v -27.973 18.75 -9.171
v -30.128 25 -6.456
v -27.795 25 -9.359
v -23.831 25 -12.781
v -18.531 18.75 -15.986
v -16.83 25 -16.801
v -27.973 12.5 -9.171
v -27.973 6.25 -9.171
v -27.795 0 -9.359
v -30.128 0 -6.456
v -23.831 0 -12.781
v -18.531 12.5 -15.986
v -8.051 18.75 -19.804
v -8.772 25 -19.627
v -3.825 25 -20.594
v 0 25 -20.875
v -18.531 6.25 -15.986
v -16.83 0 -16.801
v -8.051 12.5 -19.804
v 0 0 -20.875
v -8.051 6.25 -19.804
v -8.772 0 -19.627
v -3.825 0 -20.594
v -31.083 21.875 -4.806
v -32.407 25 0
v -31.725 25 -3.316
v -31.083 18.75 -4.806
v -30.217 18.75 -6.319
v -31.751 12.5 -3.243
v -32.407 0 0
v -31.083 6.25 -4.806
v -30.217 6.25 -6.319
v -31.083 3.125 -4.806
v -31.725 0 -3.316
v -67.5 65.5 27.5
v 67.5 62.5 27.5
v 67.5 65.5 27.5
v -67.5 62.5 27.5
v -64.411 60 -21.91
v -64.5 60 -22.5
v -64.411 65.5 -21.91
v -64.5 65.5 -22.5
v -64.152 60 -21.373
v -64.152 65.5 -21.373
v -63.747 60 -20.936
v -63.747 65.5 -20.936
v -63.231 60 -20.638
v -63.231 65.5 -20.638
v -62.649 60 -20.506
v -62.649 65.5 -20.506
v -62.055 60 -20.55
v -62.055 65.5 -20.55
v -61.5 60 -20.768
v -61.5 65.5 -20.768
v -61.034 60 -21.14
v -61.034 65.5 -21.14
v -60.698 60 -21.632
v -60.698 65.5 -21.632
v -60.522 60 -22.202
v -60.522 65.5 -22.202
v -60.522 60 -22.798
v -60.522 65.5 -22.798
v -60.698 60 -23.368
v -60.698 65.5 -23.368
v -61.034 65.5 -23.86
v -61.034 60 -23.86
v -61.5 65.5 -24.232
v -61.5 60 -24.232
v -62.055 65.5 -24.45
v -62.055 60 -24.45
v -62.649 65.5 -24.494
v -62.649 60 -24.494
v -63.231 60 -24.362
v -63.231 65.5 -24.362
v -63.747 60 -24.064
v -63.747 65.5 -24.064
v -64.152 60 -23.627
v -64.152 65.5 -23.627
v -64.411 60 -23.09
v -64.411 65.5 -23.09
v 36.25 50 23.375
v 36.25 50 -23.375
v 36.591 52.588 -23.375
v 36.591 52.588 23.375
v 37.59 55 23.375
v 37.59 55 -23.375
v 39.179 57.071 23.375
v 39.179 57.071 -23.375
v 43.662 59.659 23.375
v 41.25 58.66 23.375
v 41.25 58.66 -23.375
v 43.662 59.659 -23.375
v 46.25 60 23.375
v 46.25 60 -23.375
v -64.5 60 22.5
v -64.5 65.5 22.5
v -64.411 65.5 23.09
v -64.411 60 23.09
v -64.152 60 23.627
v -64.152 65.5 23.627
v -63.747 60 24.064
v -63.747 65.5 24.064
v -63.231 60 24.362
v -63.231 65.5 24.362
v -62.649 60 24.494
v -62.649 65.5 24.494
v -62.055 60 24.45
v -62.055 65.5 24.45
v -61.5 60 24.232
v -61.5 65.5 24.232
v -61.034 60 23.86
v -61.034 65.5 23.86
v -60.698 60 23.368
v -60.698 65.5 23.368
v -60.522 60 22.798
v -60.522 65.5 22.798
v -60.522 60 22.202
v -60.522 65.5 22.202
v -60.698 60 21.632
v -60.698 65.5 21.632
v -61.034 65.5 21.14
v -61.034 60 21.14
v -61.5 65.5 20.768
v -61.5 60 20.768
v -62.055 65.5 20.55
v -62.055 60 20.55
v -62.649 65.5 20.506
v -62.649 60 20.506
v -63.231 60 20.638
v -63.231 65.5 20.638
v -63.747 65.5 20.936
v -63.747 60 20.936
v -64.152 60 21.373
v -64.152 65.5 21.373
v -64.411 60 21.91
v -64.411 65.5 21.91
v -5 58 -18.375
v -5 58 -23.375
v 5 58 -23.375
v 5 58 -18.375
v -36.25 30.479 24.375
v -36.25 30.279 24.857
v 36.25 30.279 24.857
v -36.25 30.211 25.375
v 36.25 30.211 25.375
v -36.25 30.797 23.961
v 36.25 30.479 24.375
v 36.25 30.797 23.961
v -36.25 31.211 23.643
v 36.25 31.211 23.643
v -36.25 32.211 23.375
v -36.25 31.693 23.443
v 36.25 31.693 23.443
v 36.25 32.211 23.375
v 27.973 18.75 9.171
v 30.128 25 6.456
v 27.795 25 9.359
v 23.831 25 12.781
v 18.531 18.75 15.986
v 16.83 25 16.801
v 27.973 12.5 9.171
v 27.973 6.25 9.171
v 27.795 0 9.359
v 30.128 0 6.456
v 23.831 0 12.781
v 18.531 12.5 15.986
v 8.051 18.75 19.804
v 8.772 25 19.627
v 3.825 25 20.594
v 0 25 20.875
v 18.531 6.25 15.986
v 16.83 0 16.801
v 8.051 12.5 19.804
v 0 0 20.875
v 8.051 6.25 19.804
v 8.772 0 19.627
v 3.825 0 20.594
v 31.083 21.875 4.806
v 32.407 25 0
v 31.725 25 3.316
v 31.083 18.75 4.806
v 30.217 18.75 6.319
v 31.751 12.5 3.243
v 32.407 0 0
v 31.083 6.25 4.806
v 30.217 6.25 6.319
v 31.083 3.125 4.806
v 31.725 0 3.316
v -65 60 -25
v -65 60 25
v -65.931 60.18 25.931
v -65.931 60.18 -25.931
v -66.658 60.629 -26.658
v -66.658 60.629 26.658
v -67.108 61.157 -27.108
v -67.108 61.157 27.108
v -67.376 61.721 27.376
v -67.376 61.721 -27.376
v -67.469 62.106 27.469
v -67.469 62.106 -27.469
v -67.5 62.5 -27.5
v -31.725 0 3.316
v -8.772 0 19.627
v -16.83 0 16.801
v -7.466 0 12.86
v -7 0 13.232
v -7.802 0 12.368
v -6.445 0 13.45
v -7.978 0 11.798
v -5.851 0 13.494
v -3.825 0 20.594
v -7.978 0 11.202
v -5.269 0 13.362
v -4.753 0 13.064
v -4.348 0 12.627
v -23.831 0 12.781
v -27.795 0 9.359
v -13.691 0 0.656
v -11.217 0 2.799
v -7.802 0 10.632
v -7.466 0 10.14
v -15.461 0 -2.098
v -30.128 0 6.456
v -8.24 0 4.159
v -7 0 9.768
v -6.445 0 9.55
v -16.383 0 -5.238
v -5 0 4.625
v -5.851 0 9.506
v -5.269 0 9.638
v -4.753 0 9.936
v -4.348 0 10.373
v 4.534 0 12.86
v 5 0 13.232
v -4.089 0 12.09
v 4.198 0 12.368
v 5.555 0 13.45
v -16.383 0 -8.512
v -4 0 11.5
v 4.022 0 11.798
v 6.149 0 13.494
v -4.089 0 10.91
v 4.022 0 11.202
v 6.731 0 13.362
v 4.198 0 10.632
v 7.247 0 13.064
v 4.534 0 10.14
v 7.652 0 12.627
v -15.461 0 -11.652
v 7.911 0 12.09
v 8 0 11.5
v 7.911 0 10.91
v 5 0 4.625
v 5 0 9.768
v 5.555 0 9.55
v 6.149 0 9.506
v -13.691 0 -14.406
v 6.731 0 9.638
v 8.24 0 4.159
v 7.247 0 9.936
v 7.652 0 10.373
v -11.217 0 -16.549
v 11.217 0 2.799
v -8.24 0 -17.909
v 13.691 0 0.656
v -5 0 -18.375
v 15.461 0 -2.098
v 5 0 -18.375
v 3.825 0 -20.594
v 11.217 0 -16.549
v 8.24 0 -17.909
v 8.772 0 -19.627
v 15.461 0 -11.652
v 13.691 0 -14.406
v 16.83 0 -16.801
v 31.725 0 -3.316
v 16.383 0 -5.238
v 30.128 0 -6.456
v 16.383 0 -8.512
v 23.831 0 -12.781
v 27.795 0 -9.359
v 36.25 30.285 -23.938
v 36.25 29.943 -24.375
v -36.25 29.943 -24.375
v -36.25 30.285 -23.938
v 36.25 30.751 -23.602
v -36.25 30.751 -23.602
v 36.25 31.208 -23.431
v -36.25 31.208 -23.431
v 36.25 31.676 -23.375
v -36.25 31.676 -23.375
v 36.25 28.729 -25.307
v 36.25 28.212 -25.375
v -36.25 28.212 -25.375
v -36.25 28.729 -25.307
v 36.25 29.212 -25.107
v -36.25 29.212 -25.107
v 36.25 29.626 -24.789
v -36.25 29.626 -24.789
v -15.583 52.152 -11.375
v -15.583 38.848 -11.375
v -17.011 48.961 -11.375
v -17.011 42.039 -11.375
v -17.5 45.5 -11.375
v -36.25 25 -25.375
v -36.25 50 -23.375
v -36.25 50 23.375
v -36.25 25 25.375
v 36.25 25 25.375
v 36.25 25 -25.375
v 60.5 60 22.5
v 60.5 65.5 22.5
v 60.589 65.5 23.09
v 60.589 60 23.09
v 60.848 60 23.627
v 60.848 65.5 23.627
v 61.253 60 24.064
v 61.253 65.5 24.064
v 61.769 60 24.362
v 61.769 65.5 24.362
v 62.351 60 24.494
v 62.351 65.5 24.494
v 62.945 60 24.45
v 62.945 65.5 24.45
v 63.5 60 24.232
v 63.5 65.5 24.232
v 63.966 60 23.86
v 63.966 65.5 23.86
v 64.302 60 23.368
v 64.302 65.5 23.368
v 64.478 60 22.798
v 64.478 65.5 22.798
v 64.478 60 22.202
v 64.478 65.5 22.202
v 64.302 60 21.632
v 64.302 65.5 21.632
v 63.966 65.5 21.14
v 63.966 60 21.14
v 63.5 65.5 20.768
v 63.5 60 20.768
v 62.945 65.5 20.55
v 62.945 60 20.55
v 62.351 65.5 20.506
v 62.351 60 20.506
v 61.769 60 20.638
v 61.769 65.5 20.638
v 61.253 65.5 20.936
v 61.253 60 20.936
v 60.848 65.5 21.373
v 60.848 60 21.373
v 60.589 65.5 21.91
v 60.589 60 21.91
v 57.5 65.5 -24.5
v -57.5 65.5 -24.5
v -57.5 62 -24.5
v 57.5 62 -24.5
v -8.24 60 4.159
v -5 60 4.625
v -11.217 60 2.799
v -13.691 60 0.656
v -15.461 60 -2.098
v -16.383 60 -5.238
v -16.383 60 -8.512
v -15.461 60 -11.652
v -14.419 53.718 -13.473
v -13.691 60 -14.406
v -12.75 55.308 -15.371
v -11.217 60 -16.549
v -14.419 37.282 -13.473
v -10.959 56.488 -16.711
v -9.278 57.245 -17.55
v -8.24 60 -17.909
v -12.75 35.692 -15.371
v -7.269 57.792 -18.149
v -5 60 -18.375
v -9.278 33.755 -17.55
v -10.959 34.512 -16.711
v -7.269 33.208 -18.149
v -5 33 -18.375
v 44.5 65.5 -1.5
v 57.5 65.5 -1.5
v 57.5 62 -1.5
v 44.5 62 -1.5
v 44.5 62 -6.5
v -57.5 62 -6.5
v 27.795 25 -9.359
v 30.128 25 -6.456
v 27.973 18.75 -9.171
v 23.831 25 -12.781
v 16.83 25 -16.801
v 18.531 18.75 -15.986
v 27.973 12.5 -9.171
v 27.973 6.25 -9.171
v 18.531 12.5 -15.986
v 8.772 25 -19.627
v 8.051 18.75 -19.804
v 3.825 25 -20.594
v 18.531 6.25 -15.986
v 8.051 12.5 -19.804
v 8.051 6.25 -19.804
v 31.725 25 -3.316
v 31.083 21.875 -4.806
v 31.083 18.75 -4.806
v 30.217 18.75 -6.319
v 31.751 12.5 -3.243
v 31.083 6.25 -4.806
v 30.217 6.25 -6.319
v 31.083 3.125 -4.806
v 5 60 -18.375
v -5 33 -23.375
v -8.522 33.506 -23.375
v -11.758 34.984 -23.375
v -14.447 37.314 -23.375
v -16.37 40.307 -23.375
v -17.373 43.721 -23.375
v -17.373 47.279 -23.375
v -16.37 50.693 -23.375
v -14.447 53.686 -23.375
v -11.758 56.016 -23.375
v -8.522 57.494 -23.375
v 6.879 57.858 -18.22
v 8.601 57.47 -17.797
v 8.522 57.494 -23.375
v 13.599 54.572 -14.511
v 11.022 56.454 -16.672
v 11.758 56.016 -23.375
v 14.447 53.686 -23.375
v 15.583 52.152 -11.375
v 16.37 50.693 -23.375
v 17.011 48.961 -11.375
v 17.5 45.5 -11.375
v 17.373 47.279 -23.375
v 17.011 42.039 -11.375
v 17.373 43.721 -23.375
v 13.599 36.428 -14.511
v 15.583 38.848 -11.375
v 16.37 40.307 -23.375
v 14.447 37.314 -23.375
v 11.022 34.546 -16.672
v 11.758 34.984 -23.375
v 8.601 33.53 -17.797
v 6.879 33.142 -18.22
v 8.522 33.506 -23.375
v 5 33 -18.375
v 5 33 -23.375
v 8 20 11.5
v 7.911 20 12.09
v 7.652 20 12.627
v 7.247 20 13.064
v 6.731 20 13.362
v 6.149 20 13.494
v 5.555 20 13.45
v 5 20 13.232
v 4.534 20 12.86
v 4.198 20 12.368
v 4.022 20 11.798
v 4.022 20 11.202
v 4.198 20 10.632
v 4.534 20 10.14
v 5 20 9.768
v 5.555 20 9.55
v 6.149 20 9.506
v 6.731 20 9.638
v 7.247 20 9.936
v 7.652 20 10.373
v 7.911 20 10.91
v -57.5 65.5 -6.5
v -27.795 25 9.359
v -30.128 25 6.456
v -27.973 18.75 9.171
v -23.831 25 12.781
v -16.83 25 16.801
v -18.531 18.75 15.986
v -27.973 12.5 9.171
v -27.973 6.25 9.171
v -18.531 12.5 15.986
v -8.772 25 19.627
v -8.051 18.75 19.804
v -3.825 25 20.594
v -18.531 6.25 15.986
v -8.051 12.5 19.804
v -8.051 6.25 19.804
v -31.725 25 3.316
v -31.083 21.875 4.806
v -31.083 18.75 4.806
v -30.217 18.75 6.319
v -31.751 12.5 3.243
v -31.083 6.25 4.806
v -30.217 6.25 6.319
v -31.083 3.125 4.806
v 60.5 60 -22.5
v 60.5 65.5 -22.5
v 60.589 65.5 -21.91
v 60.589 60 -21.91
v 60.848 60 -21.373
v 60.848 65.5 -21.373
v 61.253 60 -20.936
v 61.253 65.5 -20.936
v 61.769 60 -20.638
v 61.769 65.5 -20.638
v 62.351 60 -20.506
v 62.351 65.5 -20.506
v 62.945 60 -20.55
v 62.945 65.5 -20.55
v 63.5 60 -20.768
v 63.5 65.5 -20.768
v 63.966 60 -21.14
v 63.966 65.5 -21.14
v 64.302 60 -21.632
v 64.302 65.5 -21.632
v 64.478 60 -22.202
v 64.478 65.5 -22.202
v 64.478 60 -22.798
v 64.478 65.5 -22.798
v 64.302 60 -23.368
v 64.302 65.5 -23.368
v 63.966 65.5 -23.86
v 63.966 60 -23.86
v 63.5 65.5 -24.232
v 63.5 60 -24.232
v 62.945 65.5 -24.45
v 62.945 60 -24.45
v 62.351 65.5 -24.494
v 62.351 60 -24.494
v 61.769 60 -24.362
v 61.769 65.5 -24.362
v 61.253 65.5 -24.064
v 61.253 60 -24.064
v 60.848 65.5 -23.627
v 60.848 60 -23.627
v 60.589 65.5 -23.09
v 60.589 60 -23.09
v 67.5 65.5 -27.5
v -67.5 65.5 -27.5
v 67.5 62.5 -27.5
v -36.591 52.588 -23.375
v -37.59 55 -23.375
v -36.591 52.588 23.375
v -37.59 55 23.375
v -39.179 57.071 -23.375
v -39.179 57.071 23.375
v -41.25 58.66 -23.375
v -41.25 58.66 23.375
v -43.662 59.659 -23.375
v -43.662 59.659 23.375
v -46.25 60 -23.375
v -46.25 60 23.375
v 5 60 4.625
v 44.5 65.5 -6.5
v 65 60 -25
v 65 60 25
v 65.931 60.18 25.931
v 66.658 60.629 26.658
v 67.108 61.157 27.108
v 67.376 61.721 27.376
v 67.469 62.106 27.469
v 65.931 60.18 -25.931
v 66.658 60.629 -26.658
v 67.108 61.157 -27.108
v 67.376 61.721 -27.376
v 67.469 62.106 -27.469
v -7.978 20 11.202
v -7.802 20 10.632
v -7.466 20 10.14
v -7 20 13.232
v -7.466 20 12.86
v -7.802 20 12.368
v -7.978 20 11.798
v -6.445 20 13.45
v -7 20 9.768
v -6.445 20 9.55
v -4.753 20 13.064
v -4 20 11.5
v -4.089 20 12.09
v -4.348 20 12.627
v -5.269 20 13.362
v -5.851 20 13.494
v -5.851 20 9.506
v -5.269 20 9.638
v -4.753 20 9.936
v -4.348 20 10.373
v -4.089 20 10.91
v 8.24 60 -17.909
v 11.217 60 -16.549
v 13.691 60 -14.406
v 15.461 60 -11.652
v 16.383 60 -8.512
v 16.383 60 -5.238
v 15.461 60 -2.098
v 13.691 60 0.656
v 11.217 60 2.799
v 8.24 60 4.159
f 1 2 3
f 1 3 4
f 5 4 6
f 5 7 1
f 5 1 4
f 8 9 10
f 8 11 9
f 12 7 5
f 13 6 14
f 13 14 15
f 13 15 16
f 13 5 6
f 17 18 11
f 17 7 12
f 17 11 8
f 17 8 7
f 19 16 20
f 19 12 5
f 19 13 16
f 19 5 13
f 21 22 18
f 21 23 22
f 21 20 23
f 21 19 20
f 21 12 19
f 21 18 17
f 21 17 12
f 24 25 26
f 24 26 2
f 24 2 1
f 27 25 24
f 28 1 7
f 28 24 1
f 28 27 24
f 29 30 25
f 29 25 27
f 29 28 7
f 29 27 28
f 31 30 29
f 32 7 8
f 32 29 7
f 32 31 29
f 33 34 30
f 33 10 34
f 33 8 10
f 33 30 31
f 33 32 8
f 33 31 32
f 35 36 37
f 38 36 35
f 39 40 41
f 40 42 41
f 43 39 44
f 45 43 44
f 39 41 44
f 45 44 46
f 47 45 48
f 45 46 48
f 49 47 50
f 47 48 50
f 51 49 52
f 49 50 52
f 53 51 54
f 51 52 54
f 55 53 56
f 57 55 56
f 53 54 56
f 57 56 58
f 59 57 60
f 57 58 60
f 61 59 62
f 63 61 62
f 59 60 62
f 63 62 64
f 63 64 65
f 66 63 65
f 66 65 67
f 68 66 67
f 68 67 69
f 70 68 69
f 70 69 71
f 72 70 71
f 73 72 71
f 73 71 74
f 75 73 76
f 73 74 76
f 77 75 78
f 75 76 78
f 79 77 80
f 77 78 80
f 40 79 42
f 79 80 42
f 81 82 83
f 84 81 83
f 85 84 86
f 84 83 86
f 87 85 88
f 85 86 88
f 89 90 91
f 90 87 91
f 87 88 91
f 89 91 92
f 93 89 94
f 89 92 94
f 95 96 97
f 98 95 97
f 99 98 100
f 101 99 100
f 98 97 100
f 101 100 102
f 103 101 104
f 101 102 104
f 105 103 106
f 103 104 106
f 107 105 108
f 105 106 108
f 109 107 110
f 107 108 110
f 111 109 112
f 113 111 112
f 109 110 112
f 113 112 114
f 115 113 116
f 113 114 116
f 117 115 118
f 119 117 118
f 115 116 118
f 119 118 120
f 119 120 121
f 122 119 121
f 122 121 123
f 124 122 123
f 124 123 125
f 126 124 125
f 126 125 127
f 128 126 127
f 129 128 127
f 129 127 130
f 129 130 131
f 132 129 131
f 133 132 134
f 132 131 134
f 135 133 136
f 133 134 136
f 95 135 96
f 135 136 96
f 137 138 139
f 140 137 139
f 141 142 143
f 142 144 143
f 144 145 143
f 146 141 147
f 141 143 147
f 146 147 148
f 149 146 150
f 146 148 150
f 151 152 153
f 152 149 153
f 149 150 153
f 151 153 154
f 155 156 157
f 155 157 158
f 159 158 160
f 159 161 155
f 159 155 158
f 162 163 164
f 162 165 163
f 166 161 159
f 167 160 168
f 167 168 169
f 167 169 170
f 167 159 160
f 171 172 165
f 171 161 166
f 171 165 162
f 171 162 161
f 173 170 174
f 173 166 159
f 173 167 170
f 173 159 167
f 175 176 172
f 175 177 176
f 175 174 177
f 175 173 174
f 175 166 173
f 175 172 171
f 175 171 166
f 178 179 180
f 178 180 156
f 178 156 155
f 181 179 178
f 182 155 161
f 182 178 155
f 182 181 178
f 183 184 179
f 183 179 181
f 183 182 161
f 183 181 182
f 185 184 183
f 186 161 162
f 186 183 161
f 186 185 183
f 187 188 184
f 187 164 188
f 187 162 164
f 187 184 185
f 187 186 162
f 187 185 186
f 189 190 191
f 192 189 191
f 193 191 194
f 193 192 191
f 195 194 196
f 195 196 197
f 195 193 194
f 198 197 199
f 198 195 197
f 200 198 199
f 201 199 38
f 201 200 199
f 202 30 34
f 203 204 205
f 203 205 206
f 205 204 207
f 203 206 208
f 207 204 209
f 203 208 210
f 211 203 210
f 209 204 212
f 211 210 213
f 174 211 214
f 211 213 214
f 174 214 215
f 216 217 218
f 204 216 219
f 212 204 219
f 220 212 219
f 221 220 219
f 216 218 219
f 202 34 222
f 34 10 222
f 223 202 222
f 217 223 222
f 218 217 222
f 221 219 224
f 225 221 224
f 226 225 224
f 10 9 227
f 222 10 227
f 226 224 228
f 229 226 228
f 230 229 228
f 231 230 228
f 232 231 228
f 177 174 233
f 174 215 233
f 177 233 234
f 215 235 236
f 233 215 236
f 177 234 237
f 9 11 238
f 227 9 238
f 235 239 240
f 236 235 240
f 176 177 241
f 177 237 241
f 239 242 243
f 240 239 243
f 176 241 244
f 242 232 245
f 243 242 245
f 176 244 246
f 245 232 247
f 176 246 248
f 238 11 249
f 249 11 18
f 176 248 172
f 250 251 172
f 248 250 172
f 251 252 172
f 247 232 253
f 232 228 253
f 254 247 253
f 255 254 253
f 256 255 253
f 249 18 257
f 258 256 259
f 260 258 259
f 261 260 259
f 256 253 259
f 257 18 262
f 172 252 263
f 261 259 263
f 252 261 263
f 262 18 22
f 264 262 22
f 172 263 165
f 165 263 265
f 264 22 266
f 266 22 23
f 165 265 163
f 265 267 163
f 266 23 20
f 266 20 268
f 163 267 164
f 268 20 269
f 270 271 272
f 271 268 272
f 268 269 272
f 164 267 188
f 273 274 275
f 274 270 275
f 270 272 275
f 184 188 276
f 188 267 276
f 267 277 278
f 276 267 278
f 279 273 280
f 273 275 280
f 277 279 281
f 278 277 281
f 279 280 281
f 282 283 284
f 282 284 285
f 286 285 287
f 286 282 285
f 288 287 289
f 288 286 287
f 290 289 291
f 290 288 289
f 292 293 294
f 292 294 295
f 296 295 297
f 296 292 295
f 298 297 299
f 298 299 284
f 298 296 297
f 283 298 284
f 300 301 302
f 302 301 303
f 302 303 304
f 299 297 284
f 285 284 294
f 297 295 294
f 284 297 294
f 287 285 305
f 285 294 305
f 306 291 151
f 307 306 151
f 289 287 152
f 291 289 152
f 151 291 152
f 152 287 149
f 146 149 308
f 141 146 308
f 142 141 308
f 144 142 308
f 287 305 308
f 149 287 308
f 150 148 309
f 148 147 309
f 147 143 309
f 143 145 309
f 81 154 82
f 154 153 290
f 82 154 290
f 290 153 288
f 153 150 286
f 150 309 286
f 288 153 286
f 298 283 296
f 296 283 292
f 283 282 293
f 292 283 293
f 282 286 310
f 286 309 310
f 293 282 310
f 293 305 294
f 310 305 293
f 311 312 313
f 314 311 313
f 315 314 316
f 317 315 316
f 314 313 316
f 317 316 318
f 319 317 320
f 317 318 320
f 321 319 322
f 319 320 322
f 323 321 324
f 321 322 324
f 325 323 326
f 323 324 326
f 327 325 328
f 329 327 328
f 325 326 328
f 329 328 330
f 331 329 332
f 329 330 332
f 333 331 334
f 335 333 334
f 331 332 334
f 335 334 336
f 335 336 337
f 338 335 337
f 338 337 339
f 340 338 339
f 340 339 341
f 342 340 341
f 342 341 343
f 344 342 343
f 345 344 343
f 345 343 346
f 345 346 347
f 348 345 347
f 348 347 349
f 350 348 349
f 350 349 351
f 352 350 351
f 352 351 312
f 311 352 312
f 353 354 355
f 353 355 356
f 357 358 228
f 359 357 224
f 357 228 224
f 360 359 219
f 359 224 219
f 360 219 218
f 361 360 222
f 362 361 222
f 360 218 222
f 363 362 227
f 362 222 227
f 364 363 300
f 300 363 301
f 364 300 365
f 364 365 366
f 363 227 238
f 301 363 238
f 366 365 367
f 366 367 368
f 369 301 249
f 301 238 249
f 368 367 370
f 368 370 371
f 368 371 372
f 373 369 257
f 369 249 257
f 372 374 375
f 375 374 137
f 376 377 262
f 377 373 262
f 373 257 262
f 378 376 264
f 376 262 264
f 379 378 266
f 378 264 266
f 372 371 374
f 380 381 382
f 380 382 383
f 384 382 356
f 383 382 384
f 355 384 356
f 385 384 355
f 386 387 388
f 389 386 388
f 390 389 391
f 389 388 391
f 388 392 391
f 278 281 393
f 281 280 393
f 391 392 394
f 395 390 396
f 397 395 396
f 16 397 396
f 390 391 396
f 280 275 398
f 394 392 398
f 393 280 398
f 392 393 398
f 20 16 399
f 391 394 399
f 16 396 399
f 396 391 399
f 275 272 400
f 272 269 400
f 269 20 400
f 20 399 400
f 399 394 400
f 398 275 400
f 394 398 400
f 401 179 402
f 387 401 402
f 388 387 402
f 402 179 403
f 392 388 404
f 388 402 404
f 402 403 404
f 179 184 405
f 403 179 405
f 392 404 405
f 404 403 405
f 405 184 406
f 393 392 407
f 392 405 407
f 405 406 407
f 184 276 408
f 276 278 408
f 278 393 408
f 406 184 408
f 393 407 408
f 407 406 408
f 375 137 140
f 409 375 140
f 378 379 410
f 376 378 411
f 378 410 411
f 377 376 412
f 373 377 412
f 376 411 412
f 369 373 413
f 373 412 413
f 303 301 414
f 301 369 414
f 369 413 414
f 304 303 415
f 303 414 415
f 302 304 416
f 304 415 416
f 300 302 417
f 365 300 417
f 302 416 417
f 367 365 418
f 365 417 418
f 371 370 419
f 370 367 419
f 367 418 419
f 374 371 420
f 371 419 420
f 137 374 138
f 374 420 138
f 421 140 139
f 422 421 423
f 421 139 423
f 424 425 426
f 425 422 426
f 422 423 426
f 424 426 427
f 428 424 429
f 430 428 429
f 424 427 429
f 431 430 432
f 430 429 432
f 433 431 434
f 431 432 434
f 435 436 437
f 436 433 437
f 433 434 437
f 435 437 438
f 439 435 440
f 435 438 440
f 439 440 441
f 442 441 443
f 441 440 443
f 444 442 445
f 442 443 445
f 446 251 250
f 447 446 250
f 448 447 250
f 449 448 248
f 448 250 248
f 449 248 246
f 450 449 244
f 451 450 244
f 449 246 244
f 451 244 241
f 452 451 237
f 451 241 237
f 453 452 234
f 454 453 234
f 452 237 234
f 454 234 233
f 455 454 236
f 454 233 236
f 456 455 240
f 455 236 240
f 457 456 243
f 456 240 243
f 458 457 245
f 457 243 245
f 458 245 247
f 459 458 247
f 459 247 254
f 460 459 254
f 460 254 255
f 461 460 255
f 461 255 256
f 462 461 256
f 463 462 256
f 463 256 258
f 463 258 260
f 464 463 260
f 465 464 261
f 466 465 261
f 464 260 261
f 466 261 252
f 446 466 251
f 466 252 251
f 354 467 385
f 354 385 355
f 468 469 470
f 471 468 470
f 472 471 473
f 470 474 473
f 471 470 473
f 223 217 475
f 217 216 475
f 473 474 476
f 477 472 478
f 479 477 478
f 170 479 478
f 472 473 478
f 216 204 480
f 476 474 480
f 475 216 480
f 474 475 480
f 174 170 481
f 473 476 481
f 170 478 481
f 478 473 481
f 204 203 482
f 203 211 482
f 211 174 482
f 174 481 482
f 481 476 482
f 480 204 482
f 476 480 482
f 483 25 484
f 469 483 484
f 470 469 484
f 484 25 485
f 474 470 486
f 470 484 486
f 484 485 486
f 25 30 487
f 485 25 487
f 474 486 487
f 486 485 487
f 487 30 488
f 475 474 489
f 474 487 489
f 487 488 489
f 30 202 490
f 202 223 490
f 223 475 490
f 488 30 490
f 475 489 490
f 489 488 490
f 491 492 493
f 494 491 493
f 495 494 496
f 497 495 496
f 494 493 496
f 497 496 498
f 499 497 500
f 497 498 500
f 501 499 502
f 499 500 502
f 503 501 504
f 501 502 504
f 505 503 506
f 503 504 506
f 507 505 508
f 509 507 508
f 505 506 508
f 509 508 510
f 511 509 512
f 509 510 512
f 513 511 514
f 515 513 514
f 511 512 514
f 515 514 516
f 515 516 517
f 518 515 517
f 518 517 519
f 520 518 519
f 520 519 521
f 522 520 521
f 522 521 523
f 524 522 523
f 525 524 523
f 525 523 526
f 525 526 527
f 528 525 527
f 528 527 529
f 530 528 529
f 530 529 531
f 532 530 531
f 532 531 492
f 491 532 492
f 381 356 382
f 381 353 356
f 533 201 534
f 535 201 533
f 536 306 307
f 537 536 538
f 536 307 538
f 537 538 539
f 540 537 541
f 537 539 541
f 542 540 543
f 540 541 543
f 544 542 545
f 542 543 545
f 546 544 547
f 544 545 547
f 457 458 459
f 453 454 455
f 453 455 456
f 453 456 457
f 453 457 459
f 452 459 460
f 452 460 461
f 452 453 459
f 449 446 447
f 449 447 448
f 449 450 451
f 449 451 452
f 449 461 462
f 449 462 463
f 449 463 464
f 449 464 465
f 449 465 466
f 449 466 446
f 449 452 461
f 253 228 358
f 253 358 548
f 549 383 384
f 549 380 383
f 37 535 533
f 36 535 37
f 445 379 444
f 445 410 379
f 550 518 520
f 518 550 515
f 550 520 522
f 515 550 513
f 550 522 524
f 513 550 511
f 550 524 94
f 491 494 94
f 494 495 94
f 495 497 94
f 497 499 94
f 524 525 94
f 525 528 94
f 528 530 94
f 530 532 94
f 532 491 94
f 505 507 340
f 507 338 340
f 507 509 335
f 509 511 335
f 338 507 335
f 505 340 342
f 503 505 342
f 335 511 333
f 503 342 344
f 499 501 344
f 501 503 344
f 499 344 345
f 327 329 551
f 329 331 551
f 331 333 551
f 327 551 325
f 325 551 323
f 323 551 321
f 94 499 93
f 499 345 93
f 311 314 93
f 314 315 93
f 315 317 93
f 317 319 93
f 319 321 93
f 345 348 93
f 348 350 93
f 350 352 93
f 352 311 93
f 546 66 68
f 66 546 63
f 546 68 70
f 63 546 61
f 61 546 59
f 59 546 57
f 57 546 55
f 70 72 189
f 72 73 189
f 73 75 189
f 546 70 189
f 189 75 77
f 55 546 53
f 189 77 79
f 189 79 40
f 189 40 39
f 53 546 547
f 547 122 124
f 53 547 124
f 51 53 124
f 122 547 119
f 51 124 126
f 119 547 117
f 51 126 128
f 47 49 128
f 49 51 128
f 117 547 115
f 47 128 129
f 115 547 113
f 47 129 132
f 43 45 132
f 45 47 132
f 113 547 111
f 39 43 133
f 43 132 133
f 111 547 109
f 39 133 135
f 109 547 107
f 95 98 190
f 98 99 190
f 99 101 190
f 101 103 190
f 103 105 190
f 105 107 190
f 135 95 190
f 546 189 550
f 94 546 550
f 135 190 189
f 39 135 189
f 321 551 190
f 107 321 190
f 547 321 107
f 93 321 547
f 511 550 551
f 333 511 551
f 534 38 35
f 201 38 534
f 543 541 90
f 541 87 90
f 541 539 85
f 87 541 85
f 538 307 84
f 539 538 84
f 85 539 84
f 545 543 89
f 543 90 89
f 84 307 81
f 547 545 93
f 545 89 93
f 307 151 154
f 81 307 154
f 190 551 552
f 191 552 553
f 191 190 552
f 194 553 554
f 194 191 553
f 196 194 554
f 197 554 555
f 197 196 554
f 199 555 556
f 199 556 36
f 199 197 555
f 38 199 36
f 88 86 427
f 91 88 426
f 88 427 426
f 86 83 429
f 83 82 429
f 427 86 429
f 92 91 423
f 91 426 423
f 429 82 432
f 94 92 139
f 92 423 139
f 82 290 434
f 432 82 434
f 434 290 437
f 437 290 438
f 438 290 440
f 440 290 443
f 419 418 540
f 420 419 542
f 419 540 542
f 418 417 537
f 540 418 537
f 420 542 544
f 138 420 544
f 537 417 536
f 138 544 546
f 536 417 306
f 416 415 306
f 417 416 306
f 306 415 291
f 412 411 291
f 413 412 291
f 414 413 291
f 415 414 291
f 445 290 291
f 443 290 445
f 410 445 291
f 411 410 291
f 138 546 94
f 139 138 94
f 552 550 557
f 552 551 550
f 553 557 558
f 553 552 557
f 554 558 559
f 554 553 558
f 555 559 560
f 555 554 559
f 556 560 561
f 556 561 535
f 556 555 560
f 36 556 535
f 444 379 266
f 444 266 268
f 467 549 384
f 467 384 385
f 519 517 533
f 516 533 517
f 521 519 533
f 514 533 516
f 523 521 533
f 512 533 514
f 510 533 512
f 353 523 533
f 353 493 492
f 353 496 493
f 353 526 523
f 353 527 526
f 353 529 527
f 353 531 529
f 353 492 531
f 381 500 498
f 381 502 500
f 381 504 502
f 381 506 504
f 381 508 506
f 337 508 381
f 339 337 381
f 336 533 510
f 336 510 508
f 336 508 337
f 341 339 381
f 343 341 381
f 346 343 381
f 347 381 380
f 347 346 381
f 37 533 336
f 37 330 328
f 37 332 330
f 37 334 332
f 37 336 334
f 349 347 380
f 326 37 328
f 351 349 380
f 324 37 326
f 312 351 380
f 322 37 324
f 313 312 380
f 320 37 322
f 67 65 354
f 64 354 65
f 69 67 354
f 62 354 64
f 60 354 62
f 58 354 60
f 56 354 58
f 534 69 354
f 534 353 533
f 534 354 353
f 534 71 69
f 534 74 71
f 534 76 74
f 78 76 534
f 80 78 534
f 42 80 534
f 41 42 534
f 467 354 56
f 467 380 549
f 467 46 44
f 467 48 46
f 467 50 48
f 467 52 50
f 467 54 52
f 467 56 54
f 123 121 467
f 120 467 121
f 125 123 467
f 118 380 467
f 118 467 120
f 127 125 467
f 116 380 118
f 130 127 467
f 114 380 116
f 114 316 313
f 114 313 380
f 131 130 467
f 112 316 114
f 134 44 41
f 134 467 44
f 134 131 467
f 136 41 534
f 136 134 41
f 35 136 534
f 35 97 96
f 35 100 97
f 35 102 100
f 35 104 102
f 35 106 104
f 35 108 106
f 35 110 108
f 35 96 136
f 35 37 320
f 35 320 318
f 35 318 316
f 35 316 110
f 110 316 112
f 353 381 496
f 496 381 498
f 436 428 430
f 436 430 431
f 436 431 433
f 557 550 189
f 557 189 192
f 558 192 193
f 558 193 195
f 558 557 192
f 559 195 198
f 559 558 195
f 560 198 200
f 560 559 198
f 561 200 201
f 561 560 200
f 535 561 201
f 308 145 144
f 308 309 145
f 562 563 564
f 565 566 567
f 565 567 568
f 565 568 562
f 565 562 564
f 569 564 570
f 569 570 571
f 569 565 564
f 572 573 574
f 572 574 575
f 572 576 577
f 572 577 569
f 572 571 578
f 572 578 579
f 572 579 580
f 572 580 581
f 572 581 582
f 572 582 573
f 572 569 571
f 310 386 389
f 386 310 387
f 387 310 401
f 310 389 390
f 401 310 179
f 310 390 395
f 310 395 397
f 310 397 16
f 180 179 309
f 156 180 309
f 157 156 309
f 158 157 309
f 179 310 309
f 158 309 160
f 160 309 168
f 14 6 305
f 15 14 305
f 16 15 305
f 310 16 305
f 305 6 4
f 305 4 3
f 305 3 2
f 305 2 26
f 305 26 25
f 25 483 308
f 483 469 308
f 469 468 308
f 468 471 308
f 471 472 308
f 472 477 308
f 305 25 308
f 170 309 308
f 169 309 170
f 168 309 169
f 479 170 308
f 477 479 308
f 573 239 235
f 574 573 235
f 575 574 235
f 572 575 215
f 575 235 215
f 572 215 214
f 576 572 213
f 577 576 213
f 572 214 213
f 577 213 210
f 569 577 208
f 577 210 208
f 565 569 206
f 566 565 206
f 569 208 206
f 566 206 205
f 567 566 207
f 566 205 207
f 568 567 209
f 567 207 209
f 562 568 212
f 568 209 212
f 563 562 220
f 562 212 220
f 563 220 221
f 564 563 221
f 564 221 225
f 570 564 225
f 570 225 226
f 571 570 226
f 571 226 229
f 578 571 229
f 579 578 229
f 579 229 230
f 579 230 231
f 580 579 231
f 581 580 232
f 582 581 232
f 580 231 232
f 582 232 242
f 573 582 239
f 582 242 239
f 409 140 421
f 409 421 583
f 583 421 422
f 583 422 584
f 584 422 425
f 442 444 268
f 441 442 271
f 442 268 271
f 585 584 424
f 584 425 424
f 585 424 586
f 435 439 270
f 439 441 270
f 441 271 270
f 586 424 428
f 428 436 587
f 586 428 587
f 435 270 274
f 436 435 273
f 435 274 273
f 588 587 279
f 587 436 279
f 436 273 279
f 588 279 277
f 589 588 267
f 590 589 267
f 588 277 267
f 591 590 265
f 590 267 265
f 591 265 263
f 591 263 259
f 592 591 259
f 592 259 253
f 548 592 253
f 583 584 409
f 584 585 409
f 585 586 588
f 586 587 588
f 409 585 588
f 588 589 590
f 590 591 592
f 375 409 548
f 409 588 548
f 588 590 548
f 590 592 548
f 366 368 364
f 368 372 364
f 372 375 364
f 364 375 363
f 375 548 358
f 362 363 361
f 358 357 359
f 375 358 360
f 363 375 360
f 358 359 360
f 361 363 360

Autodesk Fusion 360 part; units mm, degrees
sketch "Sketch1" plane through (0, 0, 0) normal (0, 1, 0) x (1, 0, 0)
  line L0 (-36.25, -23.375) -> (36.25, -23.375)
  line L1 (36.25, -23.375) -> (36.25, 23.375)
  line L2 (36.25, 23.375) -> (-36.25, 23.375)
  line L3 (-36.25, 23.375) -> (-36.25, -23.375)
  dimension "d62" = 72.5
  dimension "d63" = 46.75
  dimension "d64" = 23.375
  dimension "d65" = 36.25
extrude "Extrude9" add sketch "Sketch1" along normal blind 60
sketch "Sketch8" plane through (0, 0, 0) normal (0, 1, 0) x (1, 0, 0)
  line L0 (-5, -4.625) -> (5, -4.625)
  line L1 (-5, 18.375) -> (5, 18.375)
  arc A0 (-5, 18.375) -> (-5, -4.625) centre (-5, 6.875) ccw
  arc A1 (5, -4.625) -> (5, 18.375) centre (5, 6.875) ccw
  line L2 (36.25, 23.375) -> (-36.25, 23.375)
  line L3 (36.25, 23.375) -> (-36.25, 23.375)
  dimension "d39" = 10
  dimension "d40" = 5
  dimension "d94" = 23
  dimension "d123" = 28
extrude "Extrude10" cut sketch "Sketch8" along normal blind 95
sketch "Sketch9" plane through (0, 0, -23.375) normal (0, 0, -1) x (1, 0, 0)
  line L0 (36.25, 0) -> (-36.25, 0)
  line L1 (-36.25, 0) -> (-36.25, -60)
  line L2 (-36.25, -60) -> (36.25, -60)
  line L3 (36.25, -60) -> (36.25, 0)
  line L4 (-5, -33) -> (5, -33)
  line L5 (-5, -58) -> (5, -58)
  arc A0 (-5, -33) -> (-5, -58) centre (-5, -45.5) ccw
  arc A1 (5, -58) -> (5, -33) centre (5, -45.5) ccw
  dimension "d45" = 10
  dimension "d46" = 10
  dimension "d47" = 5
  dimension "d75" = 2
  dimension "d95" = 25
extrude "Extrude11" cut sketch "Sketch9" against normal blind 12 contours L4 L5 A0 A1
sketch "Sketch10" plane through (0, 60, 0) normal (0, 1, 0) x (-1, 0, 0)
  line L0 (36.25, -23.375) -> (36.25, 23.375)
  line L1 (36.25, 23.375) -> (-36.25, 23.375)
  line L2 (-36.25, 23.375) -> (-36.25, -23.375)
  line L3 (-36.25, -23.375) -> (36.25, -23.375)
  line L4 (-67.5, 27.5) -> (67.5, 27.5)
  line L5 (67.5, 27.5) -> (67.5, -27.5)
  line L6 (67.5, -27.5) -> (-67.5, -27.5)
  line L7 (-67.5, -27.5) -> (-67.5, 27.5)
  line L8 (5, -18.375) -> (-5, -18.375)
  arc A0 (-5, 4.625) -> (-5, -18.375) centre (-5, -6.875) ccw
  line L9 (-5, 4.625) -> (5, 4.625)
  arc A1 (5, -18.375) -> (5, 4.625) centre (5, -6.875) ccw
  line L10 (57.5, -6.5) -> (57.5, -24.5)
  line L11 (57.5, -24.5) -> (-57.5, -24.5)
  line L12 (-57.5, -24.5) -> (-57.5, -1.5)
  line L13 (-57.5, -1.5) -> (-44.5, -1.5)
  line L14 (-44.5, -1.5) -> (-44.5, -6.5)
  line L15 (-57.5, -12.4536) -> (-57.5, -1.5)
  line L16 (-44.5, -6.5) -> (57.5, -6.5)
  dimension "d50" = 135
  dimension "d51" = 55
  dimension "d52" = 27.5
  dimension "d53" = 67.5
  dimension "d141" = 115
  dimension "d142" = 10
  dimension "d143" = 13
  dimension "d144" = 23
  dimension "d145" = 18
  dimension "d146" = 3
extrude "Extrude12" add sketch "Sketch10" along normal blind 5.5 contours L0 L2 L3 L8 A0 A1 L16 | L0 L2 L3 L10 L11 L12 L13 L14 L15 L16 | L0 L1 L2 A0 L9 A1 L16 | A0 L9 A1 L16 | L8 A0 A1 L16 | L4 L5 L6 L7
sketch "Sketch13" plane through (0, 0, -23.375) normal (0, 0, -1) x (1, 0, 0)
  line L0 (5, -58) -> (-5, -58)
  arc A0 (-5, -33) -> (-5, -58) centre (-5, -45.5) ccw
  line L1 (-5, -33) -> (5, -33)
  arc A1 (5, -58) -> (5, -33) centre (5, -45.5) ccw
  line L2 (36.25, 0) -> (-36.25, 0)
  line L3 (-36.25, 0) -> (-36.25, -60)
  line L4 (-36.25, -60) -> (36.25, -60)
  line L5 (36.25, -60) -> (36.25, 0)
  line L6 (-36.25, -30.2113) -> (36.25, -30.2113)
  line L7 (36.25, -30.2113) -> (36.25, -25)
  line L8 (36.25, -25) -> (-36.25, -25)
  line L9 (-36.25, -25) -> (-36.25, -30.2113)
  dimension "d113" = 25
extrude "Extrude17" add sketch "Sketch13" along normal blind 2 contours L3 L5 L6 L7 L8 L9
sketch "Sketch14" plane through (0, 65.5, 0) normal (0, 1, 0) x (-1, 0, 0)
  line L0 (-67.5, -27.5) -> (67.5, -27.5)
  line L1 (67.5, -27.5) -> (67.5, 27.5)
  line L2 (67.5, 27.5) -> (-67.5, 27.5)
  line L3 (-67.5, 27.5) -> (-67.5, -27.5)
  circle A0 centre (-62.5, 22.5) radius 2
  circle A1 centre (-62.5, -22.5) radius 2
  circle A2 centre (62.5, 22.5) radius 2
  circle A3 centre (62.5, -22.5) radius 2
  dimension "d78" = 4
  dimension "d79" = 4
  dimension "d80" = 4
  dimension "d81" = 4
  dimension "d83" = 5
  dimension "d84" = 5
  dimension "d85" = 5
  dimension "d86" = 5
  dimension "d88" = 5
  dimension "d89" = 5
  dimension "d90" = 5
  dimension "d91" = 5
extrude "Extrude18" cut sketch "Sketch14" against normal blind 15 contours A0 | A1 | A2 | A3
fillet "Fillet1" radius 2 2 edges at (0, 30.2113, -25.375) (0, 30.2113, -23.375)
sketch "Sketch15" plane through (0, 0, 0) normal (0, -1, 0) x (1, 0, 0)
  line L0 (5, -18.375) -> (-5, -18.375)
  arc A0 (-5, 4.625) -> (-5, -18.375) centre (-5, -6.875) ccw
  line L1 (-5, 4.625) -> (5, 4.625)
  arc A1 (5, -18.375) -> (5, 4.625) centre (5, -6.875) ccw
  line L2 (-36.25, 23.375) -> (-36.25, -23.375)
  line L3 (-36.25, -23.375) -> (36.25, -23.375)
  line L4 (36.25, -23.375) -> (36.25, 23.375)
  line L5 (36.25, 23.375) -> (-36.25, 23.375)
  circle A2 centre (-6, 11.5) radius 2
  circle A3 centre (6, 11.5) radius 2
  dimension "d99" = 4
  dimension "d100" = 4
  dimension "d101" = 12
  dimension "d102" = 6
  dimension "d103" = 6
  dimension "d140" = 11.5
extrude "Extrude19" cut sketch "Sketch15" against normal blind 20 contours A2 | A3
ref_plane "WorkPlane1" through (0, 30, 0) normal (0, 0, -1) x (-1, 0, 0)
mirror "Mirror2" about plane through (0, 30, 0) normal (0, 0, -1) of "Extrude17"
sketch "Sketch17" plane through (0, 0, 0) normal (0, -1, 0) x (1, 0, 0)
  line L0 (5, -18.375) -> (-5, -18.375)
  arc A0 (-5, 4.625) -> (-5, -18.375) centre (-5, -6.875) ccw
  line L1 (-5, 4.625) -> (5, 4.625)
  arc A1 (5, -18.375) -> (5, 4.625) centre (5, -6.875) ccw
  line L2 (-36.25, 23.375) -> (-36.25, -23.375)
  line L3 (-36.25, -23.375) -> (36.25, -23.375)
  line L4 (36.25, -23.375) -> (36.25, 23.375)
  line L5 (36.25, 23.375) -> (-36.25, 23.375)
  circle A2 centre (-5, -6.875) radius 3
  circle A3 centre (5, -6.875) radius 3
  line L6 (-5, 4.625) -> (5, 4.625)
  line L7 (-5, -18.375) -> (5, -18.375)
  circle A4 centre (-6, 11.5) radius 2
  circle A5 centre (6, 11.5) radius 2
  dimension "d114" = 6
fillet "Fillet3" radius 2.5 4 edges at (0, 60, 27.5) (-67.5, 60, 0) (67.5, 60, 0) (0, 60, -27.5)
fillet "Fillet7" radius 2 1 edges at (0, 30.2113, 23.375)
fillet "Fillet10" radius 10 2 edges at (36.25, 60, 0) (-36.25, 60, 0)
sketch "Sketch18" plane through (0, 0, 0) normal (0, -1, 0) x (1, 0, 0)
  circle A0 centre (-6, 11.5) radius 2
  circle A1 centre (6, 11.5) radius 2
  line L0 (5, -18.375) -> (-5, -18.375)
  arc A2 (-5, 4.625) -> (-5, -18.375) centre (-5, -6.875) ccw
  line L1 (-5, 4.625) -> (5, 4.625)
  arc A3 (5, -18.375) -> (5, 4.625) centre (5, -6.875) ccw
  line L2 (-36.25, 23.375) -> (-36.25, -23.375)
  line L3 (-36.25, -23.375) -> (36.25, -23.375)
  line L4 (36.25, -23.375) -> (36.25, 23.375)
  line L5 (36.25, 23.375) -> (-36.25, 23.375)
  line L6 (-33.75, -20.875) -> (33.75, -20.875)
  line L7 (33.75, -20.875) -> (33.75, 20.875)
  line L8 (33.75, 20.875) -> (-33.75, 20.875)
  line L9 (-33.75, 20.875) -> (-33.75, -20.875)
  dimension "d134" = -2.5
extrude "Extrude21" cut sketch "Sketch18" against normal blind 25 contours L2 L3 L4 L5
sketch "Sketch19" plane through (0, 0, 0) normal (0, -1, 0) x (1, 0, 0)
  line L0 (33.75, 20.875) -> (-33.75, 20.875)
  line L1 (-33.75, 20.875) -> (-33.75, -20.875)
  line L2 (-33.75, -20.875) -> (33.75, -20.875)
  line L3 (33.75, -20.875) -> (33.75, 20.875)
  circle A0 centre (-6, 11.5) radius 2
  circle A1 centre (6, 11.5) radius 2
  line L4 (5, -18.375) -> (-5, -18.375)
  arc A2 (-5, 4.625) -> (-5, -18.375) centre (-5, -6.875) ccw
  line L5 (-5, 4.625) -> (5, 4.625)
  arc A3 (5, -18.375) -> (5, 4.625) centre (5, -6.875) ccw
  line L6 (-32.4071, 0) -> (-31.9234, 9.9156) construction
  line L7 (-31.9234, 9.9156) -> (-18.8638, 18.622) construction
  line L8 (-18.8638, 18.622) -> (-5.8043, 20.875) construction
  line L9 (-5.8043, 20.875) -> (0, 20.875) construction
  spline S0 degree 4 poles (-32.4071, 0) (-31.9234, 9.9156) (-18.8638, 18.622) (-5.8043, 20.875) (0, 20.875) knots 0 0 0 0 0 1 1 1 1 1
  line L10 (-78.035, 0) -> (72.5532, 0) construction
  line L11 (0, 0) -> (0, 55.866) construction
  spline S1 degree 4 poles (32.4071, 0) (31.9234, 9.9156) (18.8638, 18.622) (5.8043, 20.875) (0, 20.875) knots 0 0 0 0 0 1 1 1 1 1
  line L12 (32.4071, 0) -> (31.9234, 9.9156) construction
  line L13 (31.9234, 9.9156) -> (18.8638, 18.622) construction
  line L14 (18.8638, 18.622) -> (5.8043, 20.875) construction
  line L15 (5.8043, 20.875) -> (0, 20.875) construction
  spline S2 degree 4 poles (-32.4071, 0) (-31.9234, -9.9156) (-18.8638, -18.622) (-5.8043, -20.875) (0, -20.875) knots 0 0 0 0 0 1 1 1 1 1
  line L16 (-32.4071, 0) -> (-31.9234, -9.9156) construction
  line L17 (-31.9234, -9.9156) -> (-18.8638, -18.622) construction
  line L18 (-18.8638, -18.622) -> (-5.8043, -20.875) construction
  line L19 (-5.8043, -20.875) -> (0, -20.875) construction
  spline S3 degree 4 poles (32.4071, 0) (31.9234, -9.9156) (18.8638, -18.622) (5.8043, -20.875) (0, -20.875) knots 0 0 0 0 0 1 1 1 1 1
  line L20 (32.4071, 0) -> (31.9234, -9.9156) construction
  line L21 (31.9234, -9.9156) -> (18.8638, -18.622) construction
  line L22 (18.8638, -18.622) -> (5.8043, -20.875) construction
  line L23 (5.8043, -20.875) -> (0, -20.875) construction
extrude "Extrude22" cut sketch "Sketch19" against normal blind 25 contours L0 L2 L3 S1 S3 | L0 L1 L2 S0 S2
sketch "Sketch20" plane through (0, 65.5, 0) normal (0, 1, 0) x (-1, 0, 0)
  line L0 (-44.5, -6.5) -> (57.5, -6.5)
  line L1 (-44.5, -1.5) -> (-44.5, -6.5)
  line L2 (-57.5, -1.5) -> (-44.5, -1.5)
  line L3 (57.5, -6.5) -> (57.5, -24.5)
  line L4 (-57.5, -24.5) -> (-57.5, -1.5)
  line L5 (57.5, -24.5) -> (-57.5, -24.5)
  line L6 (-57.5, -12.4536) -> (-57.5, -1.5)
  line L7 (-67.5, -27.5) -> (-67.5, 27.5)
  line L8 (67.5, -27.5) -> (-67.5, -27.5)
  dimension "d147" = 115
  dimension "d148" = 13
  dimension "d149" = 23
  dimension "d150" = 18
  dimension "d151" = 10
  dimension "d152" = 3
extrude "Extrude23" cut sketch "Sketch20" against normal blind 3.5
equation "d52 = ( 55 / 2 ) * 1 mm"
equation "d53 = ( 135 / 2 ) * 1 mm"
equation "d64 = ( 46.75 / 2 ) * 1 mm"
equation "d65 = ( 72.5 / 2 ) * 1 mm"
equation "d108 = -( ( 46.75 / 2 ) * 1 mm )"
